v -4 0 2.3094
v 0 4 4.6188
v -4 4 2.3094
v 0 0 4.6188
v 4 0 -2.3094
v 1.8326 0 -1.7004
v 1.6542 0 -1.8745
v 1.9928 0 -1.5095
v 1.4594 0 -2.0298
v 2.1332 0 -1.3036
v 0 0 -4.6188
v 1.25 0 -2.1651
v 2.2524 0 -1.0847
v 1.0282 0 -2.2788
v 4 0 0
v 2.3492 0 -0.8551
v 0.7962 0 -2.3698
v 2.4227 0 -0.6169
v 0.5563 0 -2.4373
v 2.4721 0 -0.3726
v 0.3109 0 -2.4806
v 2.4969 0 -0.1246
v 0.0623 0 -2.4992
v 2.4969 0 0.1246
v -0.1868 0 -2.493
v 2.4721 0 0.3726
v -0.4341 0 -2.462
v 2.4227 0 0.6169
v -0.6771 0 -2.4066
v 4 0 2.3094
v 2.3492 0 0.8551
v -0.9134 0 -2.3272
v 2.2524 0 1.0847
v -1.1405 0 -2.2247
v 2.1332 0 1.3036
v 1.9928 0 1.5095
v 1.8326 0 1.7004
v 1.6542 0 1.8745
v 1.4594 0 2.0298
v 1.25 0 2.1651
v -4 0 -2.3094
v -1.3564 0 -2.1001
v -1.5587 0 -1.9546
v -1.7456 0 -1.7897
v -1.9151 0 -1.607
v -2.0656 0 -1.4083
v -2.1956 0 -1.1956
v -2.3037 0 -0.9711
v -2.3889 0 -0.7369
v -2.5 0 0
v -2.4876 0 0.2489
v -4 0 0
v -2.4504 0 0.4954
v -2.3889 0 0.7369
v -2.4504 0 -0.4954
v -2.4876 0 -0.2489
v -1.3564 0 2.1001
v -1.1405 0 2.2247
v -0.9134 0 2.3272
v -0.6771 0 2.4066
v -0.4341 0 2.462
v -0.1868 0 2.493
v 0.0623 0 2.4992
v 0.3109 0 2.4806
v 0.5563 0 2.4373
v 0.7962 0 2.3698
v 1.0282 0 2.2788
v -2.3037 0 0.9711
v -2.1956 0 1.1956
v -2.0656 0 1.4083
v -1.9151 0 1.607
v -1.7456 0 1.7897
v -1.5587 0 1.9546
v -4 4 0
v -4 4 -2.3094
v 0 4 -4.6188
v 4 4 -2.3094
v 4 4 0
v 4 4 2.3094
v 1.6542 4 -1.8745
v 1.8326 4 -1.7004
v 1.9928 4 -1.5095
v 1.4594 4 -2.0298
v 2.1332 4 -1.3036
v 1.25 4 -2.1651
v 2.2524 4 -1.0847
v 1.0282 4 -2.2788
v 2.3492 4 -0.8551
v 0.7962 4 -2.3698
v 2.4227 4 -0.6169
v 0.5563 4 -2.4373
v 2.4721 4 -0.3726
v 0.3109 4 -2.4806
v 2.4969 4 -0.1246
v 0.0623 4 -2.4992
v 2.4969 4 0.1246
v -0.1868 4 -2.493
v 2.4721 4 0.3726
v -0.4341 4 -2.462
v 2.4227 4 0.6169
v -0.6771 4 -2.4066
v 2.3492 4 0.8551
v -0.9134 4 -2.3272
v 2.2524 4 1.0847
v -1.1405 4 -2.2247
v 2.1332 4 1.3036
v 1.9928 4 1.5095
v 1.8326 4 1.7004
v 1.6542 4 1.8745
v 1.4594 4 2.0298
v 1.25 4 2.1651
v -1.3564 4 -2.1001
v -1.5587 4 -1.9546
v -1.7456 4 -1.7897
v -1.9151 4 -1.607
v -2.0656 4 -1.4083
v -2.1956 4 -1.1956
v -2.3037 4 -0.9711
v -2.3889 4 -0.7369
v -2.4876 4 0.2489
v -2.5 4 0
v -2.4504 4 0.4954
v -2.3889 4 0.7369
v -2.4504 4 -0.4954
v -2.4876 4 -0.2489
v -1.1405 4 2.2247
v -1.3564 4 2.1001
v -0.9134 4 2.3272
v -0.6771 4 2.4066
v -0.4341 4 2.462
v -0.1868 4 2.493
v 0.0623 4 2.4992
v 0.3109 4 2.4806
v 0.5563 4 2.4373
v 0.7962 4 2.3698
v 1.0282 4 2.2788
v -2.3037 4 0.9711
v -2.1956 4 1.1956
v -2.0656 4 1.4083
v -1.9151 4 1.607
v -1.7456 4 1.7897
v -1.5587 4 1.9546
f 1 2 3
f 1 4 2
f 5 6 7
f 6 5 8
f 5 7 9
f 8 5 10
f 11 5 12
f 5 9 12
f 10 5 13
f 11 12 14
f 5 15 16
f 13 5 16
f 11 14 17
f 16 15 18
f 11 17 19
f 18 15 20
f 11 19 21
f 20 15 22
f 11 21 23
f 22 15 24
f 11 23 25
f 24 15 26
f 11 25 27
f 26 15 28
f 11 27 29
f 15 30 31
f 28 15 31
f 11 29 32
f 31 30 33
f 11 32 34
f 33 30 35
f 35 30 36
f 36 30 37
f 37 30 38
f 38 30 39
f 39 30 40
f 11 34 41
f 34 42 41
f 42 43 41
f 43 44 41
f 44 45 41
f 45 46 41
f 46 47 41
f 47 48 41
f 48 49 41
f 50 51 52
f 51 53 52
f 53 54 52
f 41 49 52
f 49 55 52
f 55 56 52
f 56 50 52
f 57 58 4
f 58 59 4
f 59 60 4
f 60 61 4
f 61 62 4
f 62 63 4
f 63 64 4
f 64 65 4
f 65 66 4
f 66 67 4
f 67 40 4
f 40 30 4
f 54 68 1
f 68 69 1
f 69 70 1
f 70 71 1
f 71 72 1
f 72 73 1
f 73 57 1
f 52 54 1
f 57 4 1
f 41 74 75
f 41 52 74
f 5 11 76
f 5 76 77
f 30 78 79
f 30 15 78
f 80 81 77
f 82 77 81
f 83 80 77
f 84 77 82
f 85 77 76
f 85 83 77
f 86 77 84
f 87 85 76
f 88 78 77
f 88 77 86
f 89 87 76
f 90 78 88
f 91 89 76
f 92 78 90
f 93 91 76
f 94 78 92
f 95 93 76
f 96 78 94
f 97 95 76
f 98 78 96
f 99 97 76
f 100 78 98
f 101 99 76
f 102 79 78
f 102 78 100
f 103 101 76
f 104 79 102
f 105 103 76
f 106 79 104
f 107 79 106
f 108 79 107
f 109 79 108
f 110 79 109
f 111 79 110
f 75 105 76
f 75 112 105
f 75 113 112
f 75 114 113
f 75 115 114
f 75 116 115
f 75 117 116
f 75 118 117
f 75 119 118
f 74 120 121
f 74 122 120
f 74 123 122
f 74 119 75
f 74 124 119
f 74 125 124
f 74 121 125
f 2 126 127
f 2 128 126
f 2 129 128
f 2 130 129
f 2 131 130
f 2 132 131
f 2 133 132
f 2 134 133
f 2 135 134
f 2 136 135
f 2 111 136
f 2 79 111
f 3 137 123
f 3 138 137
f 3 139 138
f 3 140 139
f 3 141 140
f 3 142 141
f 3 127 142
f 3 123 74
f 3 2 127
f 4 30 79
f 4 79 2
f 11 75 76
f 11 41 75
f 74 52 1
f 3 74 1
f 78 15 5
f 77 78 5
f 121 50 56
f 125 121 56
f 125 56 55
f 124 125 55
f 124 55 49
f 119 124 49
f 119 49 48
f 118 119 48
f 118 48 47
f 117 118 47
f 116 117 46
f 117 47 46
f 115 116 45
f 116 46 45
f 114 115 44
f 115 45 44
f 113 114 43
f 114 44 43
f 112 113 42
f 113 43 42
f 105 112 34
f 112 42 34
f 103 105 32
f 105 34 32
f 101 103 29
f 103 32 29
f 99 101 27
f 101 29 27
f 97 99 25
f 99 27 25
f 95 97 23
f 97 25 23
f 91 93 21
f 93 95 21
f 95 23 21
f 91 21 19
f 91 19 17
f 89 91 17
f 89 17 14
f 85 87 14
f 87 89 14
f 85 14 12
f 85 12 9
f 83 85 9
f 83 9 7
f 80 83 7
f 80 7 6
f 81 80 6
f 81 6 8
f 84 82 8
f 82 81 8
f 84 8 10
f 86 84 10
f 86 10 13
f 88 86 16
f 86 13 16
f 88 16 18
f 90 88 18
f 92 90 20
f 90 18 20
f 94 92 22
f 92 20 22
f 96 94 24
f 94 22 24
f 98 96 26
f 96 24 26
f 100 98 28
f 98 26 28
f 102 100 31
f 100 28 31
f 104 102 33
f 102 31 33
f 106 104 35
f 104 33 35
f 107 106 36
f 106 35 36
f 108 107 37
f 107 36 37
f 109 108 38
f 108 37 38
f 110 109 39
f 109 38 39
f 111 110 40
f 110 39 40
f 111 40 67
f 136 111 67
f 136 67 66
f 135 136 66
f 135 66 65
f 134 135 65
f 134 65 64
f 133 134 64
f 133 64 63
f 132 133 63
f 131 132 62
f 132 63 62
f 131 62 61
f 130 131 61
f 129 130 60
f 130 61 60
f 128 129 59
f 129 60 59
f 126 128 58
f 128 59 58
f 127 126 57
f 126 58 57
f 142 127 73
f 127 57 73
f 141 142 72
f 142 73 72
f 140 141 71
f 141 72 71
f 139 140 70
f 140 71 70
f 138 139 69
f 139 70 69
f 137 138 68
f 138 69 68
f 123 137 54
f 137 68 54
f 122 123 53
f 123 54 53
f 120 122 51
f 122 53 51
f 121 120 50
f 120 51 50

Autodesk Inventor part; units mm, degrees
ref_plane "YZ Plane" through (0, 0, 0) normal (1, 0, 0) x (0, 1, 0)
ref_plane "XZ Plane" through (0, 0, 0) normal (0, 1, 0) x (-1, 0, 0)
ref_plane "XY Plane" through (0, 0, 0) normal (0, 0, 1) x (1, 0, 0)
sketch "Skizze3" plane through (0, 0, 0) normal (0, 1, 0) x (-1, 0, 0)
  circle A0 centre (0, 0) radius 2.5
  line L0 (4, 0) -> (4, 9.599)
  line L1 (4, 9.599) -> (4, -8.7779)
  line L2 (-4, 0) -> (-4, 9.2876)
  line L3 (-4, 9.2876) -> (-4, -8.3814)
  line L4 (-6.313, 8.2636) -> (9.6019, -0.9248)
  line L5 (-10.313, -1.3354) -> (5.6019, 7.853)
  line L6 (-4, -9.599) -> (-4, 8.7779)
  line L7 (6.313, -8.2636) -> (-9.6019, 0.9248)
  line L8 (10.313, 1.3354) -> (-5.6019, -7.853)
  point P0 (0, -4.6188)
  point P1 (4, -2.3094)
  point P2 (4, 2.3094)
  point P3 (0, 4.6188)
  point P4 (-4, 2.3094)
  point P5 (-4, -2.3094)
  dimension "d34" = 5
  dimension "d38" = 360
extrude "Extrusion1" add sketch "Skizze3" along normal blind 4 contours L1 L8 L7 L3 L2 L5 L4 L0
properties part number "01-03-01 Kugellager" material "Stahl, Guss"
